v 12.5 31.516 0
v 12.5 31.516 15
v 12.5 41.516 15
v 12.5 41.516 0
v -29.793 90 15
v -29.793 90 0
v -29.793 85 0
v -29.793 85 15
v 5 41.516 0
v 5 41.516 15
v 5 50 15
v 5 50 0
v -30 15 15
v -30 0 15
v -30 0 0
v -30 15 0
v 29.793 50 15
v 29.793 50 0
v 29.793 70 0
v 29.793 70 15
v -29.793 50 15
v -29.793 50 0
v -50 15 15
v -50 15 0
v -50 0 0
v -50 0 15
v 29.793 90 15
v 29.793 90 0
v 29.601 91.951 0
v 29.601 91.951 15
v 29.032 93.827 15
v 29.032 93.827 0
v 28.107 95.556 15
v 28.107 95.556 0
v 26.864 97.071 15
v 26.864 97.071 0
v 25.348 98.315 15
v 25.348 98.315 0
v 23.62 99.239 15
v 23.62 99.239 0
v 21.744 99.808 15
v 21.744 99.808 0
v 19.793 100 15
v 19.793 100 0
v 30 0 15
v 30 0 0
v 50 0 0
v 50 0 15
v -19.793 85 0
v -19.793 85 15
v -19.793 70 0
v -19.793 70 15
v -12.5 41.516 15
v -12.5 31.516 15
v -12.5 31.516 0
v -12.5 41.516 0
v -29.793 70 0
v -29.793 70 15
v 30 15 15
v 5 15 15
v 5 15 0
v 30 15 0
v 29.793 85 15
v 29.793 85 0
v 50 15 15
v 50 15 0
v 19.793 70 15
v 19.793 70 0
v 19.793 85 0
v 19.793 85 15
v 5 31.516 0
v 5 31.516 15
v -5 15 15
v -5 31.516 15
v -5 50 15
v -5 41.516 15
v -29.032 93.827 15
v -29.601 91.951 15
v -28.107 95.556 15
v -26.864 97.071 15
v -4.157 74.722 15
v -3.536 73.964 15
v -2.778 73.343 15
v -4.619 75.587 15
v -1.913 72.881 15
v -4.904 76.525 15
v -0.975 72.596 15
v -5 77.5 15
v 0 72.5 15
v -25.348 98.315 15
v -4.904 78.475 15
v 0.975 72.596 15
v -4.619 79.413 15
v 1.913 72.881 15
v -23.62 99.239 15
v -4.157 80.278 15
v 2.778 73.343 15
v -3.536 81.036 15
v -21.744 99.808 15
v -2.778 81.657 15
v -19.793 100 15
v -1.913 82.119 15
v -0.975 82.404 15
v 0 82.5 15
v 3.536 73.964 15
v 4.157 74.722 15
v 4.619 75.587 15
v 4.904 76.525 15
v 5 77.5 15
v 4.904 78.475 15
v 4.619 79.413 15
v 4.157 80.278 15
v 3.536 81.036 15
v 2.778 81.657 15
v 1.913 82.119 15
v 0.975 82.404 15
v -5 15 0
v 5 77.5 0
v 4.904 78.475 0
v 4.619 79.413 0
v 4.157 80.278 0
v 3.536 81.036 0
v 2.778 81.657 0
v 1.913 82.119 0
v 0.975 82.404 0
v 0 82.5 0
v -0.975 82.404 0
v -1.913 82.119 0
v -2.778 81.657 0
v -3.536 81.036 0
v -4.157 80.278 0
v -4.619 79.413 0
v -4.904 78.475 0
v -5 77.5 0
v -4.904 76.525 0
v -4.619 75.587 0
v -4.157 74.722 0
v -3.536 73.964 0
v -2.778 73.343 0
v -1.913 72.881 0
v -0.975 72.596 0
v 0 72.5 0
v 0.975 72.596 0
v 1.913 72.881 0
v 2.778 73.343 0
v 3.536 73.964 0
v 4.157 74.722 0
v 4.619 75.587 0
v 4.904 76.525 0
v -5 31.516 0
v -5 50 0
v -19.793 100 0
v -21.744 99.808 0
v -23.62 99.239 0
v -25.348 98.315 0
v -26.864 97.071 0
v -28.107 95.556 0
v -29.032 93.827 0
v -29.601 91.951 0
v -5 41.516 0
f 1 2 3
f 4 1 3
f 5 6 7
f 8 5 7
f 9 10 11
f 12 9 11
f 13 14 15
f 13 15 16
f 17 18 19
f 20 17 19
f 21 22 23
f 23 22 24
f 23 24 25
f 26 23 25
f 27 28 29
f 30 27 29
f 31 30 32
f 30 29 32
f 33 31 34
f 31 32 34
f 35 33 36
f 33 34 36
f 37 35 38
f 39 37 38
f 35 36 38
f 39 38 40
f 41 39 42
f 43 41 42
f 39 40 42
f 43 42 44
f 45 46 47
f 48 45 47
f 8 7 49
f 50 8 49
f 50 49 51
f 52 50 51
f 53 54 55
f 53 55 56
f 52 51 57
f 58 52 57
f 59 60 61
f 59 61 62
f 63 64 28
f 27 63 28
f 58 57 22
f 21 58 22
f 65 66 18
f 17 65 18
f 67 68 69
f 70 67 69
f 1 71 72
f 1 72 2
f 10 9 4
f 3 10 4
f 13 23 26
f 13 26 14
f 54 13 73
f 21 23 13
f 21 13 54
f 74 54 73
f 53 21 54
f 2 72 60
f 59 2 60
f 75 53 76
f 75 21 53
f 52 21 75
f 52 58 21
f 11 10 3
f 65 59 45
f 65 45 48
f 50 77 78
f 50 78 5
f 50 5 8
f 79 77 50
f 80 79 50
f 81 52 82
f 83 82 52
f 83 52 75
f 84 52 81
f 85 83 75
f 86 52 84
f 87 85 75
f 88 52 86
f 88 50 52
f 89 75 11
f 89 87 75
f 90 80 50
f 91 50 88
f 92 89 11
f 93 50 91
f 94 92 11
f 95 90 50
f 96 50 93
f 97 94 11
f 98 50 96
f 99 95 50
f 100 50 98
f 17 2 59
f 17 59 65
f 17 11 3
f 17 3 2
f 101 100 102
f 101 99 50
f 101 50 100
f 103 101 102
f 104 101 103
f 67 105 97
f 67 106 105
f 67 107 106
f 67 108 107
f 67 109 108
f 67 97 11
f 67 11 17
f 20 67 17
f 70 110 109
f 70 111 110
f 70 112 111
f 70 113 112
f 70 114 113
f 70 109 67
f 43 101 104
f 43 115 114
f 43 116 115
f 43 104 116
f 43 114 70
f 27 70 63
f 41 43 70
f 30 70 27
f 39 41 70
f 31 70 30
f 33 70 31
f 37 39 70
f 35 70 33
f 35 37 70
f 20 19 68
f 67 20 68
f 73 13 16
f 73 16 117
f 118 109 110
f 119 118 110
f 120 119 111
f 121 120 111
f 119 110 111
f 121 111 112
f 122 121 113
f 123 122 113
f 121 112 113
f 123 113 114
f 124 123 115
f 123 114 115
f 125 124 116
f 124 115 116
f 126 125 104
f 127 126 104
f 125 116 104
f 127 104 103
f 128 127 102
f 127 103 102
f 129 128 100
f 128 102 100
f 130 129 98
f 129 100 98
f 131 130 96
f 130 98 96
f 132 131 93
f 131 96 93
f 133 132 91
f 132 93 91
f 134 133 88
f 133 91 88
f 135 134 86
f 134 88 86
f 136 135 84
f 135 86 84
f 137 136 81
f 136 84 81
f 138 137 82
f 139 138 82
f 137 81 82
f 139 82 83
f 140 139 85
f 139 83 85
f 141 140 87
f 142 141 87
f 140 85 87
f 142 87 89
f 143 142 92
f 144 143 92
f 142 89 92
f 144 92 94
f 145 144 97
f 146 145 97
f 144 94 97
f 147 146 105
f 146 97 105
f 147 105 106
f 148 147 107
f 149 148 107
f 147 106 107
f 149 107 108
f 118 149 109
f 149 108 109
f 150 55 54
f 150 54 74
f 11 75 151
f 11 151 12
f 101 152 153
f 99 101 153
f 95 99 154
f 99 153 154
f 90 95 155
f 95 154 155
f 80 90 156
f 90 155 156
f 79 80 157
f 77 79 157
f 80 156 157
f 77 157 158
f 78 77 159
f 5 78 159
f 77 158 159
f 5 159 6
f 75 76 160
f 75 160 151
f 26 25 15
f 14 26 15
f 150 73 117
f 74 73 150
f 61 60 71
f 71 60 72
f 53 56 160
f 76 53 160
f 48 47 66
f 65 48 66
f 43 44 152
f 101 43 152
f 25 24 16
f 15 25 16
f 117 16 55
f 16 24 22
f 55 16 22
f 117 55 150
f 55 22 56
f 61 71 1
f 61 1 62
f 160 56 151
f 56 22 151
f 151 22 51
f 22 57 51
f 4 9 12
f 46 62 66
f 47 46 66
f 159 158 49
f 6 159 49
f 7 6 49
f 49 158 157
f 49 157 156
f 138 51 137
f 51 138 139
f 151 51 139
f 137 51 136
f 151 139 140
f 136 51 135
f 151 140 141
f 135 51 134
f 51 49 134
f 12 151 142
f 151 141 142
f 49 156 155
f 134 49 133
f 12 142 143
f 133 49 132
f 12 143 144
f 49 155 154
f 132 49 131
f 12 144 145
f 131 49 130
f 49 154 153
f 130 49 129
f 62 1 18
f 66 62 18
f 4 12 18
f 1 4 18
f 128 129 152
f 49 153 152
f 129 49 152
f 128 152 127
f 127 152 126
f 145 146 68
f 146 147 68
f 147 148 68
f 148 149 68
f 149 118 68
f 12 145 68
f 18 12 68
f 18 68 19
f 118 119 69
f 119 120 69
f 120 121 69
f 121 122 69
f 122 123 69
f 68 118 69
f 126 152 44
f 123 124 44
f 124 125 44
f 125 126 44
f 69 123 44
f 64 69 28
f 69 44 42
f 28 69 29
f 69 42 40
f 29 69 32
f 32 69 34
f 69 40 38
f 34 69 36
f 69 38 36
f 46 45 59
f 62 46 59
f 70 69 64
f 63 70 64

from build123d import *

# Parameters (mm, degrees)
BOSS_EXTRU_1_DEPTH      = 15
ESQUISSE3_R             = 5
ESQUISSE3_W             = 60
ESQUISSE3_H             = 15
ESQUISSE3_W_2           = 10
ESQUISSE3_H_2           = 50
ESQUISSE3_W_3           = 25
ESQUISSE3_H_3           = 10
ENL_V_MAT_EXTRU_1_DEPTH = 15


with BuildPart() as part:
    # Esquisse2 → Boss.-Extru.1 (new body)
    with BuildSketch(Plane.XY):
        with BuildLine():
            Line((-50, 0), (50, 0))
            Line((50, 0), (50, 15))
            Line((50, 15), (29.792740578, 50))
            Line((29.792740578, 50), (29.792740578, 70))
            Line((29.792740578, 70), (19.792740578, 70))
            Line((19.792740578, 70), (19.792740578, 85))
            Line((19.792740578, 85), (29.792740578, 85))
            Line((29.792740578, 85), (29.792740578, 90))
            ThreePointArc((29.792740578, 90), (26.86380839, 97.071067812), (19.792740578, 100))
            Line((19.792740578, 100), (-19.792740578, 100))
            ThreePointArc((-19.792740578, 100), (-26.86380839, 97.071067812), (-29.792740578, 90))
            Line((-29.792740578, 90), (-29.792740578, 85))
            Line((-29.792740578, 85), (-19.792740578, 85))
            Line((-19.792740578, 85), (-19.792740578, 70))
            Line((-19.792740578, 70), (-29.792740578, 70))
            Line((-29.792740578, 70), (-29.792740578, 50))
            Line((-29.792740578, 50), (-50, 15))
            Line((-50, 15), (-50, 0))
        make_face()
    extrude(amount=BOSS_EXTRU_1_DEPTH)

    # Esquisse3 → Enlèv. mat.-Extru.1 (cut)
    with BuildSketch(Plane.XY.offset(15)):
        with Locations((0, 77.5)):
            Circle(ESQUISSE3_R)
        with Locations((0, 7.5)):
            Rectangle(ESQUISSE3_W, ESQUISSE3_H)
        with Locations((0, 25)):
            Rectangle(ESQUISSE3_W_2, ESQUISSE3_H_2)
        with Locations((0, 36.515847226)):
            Rectangle(ESQUISSE3_W_3, ESQUISSE3_H_3)
    extrude(amount=-ENL_V_MAT_EXTRU_1_DEPTH, mode=Mode.SUBTRACT)


solid = part.part
